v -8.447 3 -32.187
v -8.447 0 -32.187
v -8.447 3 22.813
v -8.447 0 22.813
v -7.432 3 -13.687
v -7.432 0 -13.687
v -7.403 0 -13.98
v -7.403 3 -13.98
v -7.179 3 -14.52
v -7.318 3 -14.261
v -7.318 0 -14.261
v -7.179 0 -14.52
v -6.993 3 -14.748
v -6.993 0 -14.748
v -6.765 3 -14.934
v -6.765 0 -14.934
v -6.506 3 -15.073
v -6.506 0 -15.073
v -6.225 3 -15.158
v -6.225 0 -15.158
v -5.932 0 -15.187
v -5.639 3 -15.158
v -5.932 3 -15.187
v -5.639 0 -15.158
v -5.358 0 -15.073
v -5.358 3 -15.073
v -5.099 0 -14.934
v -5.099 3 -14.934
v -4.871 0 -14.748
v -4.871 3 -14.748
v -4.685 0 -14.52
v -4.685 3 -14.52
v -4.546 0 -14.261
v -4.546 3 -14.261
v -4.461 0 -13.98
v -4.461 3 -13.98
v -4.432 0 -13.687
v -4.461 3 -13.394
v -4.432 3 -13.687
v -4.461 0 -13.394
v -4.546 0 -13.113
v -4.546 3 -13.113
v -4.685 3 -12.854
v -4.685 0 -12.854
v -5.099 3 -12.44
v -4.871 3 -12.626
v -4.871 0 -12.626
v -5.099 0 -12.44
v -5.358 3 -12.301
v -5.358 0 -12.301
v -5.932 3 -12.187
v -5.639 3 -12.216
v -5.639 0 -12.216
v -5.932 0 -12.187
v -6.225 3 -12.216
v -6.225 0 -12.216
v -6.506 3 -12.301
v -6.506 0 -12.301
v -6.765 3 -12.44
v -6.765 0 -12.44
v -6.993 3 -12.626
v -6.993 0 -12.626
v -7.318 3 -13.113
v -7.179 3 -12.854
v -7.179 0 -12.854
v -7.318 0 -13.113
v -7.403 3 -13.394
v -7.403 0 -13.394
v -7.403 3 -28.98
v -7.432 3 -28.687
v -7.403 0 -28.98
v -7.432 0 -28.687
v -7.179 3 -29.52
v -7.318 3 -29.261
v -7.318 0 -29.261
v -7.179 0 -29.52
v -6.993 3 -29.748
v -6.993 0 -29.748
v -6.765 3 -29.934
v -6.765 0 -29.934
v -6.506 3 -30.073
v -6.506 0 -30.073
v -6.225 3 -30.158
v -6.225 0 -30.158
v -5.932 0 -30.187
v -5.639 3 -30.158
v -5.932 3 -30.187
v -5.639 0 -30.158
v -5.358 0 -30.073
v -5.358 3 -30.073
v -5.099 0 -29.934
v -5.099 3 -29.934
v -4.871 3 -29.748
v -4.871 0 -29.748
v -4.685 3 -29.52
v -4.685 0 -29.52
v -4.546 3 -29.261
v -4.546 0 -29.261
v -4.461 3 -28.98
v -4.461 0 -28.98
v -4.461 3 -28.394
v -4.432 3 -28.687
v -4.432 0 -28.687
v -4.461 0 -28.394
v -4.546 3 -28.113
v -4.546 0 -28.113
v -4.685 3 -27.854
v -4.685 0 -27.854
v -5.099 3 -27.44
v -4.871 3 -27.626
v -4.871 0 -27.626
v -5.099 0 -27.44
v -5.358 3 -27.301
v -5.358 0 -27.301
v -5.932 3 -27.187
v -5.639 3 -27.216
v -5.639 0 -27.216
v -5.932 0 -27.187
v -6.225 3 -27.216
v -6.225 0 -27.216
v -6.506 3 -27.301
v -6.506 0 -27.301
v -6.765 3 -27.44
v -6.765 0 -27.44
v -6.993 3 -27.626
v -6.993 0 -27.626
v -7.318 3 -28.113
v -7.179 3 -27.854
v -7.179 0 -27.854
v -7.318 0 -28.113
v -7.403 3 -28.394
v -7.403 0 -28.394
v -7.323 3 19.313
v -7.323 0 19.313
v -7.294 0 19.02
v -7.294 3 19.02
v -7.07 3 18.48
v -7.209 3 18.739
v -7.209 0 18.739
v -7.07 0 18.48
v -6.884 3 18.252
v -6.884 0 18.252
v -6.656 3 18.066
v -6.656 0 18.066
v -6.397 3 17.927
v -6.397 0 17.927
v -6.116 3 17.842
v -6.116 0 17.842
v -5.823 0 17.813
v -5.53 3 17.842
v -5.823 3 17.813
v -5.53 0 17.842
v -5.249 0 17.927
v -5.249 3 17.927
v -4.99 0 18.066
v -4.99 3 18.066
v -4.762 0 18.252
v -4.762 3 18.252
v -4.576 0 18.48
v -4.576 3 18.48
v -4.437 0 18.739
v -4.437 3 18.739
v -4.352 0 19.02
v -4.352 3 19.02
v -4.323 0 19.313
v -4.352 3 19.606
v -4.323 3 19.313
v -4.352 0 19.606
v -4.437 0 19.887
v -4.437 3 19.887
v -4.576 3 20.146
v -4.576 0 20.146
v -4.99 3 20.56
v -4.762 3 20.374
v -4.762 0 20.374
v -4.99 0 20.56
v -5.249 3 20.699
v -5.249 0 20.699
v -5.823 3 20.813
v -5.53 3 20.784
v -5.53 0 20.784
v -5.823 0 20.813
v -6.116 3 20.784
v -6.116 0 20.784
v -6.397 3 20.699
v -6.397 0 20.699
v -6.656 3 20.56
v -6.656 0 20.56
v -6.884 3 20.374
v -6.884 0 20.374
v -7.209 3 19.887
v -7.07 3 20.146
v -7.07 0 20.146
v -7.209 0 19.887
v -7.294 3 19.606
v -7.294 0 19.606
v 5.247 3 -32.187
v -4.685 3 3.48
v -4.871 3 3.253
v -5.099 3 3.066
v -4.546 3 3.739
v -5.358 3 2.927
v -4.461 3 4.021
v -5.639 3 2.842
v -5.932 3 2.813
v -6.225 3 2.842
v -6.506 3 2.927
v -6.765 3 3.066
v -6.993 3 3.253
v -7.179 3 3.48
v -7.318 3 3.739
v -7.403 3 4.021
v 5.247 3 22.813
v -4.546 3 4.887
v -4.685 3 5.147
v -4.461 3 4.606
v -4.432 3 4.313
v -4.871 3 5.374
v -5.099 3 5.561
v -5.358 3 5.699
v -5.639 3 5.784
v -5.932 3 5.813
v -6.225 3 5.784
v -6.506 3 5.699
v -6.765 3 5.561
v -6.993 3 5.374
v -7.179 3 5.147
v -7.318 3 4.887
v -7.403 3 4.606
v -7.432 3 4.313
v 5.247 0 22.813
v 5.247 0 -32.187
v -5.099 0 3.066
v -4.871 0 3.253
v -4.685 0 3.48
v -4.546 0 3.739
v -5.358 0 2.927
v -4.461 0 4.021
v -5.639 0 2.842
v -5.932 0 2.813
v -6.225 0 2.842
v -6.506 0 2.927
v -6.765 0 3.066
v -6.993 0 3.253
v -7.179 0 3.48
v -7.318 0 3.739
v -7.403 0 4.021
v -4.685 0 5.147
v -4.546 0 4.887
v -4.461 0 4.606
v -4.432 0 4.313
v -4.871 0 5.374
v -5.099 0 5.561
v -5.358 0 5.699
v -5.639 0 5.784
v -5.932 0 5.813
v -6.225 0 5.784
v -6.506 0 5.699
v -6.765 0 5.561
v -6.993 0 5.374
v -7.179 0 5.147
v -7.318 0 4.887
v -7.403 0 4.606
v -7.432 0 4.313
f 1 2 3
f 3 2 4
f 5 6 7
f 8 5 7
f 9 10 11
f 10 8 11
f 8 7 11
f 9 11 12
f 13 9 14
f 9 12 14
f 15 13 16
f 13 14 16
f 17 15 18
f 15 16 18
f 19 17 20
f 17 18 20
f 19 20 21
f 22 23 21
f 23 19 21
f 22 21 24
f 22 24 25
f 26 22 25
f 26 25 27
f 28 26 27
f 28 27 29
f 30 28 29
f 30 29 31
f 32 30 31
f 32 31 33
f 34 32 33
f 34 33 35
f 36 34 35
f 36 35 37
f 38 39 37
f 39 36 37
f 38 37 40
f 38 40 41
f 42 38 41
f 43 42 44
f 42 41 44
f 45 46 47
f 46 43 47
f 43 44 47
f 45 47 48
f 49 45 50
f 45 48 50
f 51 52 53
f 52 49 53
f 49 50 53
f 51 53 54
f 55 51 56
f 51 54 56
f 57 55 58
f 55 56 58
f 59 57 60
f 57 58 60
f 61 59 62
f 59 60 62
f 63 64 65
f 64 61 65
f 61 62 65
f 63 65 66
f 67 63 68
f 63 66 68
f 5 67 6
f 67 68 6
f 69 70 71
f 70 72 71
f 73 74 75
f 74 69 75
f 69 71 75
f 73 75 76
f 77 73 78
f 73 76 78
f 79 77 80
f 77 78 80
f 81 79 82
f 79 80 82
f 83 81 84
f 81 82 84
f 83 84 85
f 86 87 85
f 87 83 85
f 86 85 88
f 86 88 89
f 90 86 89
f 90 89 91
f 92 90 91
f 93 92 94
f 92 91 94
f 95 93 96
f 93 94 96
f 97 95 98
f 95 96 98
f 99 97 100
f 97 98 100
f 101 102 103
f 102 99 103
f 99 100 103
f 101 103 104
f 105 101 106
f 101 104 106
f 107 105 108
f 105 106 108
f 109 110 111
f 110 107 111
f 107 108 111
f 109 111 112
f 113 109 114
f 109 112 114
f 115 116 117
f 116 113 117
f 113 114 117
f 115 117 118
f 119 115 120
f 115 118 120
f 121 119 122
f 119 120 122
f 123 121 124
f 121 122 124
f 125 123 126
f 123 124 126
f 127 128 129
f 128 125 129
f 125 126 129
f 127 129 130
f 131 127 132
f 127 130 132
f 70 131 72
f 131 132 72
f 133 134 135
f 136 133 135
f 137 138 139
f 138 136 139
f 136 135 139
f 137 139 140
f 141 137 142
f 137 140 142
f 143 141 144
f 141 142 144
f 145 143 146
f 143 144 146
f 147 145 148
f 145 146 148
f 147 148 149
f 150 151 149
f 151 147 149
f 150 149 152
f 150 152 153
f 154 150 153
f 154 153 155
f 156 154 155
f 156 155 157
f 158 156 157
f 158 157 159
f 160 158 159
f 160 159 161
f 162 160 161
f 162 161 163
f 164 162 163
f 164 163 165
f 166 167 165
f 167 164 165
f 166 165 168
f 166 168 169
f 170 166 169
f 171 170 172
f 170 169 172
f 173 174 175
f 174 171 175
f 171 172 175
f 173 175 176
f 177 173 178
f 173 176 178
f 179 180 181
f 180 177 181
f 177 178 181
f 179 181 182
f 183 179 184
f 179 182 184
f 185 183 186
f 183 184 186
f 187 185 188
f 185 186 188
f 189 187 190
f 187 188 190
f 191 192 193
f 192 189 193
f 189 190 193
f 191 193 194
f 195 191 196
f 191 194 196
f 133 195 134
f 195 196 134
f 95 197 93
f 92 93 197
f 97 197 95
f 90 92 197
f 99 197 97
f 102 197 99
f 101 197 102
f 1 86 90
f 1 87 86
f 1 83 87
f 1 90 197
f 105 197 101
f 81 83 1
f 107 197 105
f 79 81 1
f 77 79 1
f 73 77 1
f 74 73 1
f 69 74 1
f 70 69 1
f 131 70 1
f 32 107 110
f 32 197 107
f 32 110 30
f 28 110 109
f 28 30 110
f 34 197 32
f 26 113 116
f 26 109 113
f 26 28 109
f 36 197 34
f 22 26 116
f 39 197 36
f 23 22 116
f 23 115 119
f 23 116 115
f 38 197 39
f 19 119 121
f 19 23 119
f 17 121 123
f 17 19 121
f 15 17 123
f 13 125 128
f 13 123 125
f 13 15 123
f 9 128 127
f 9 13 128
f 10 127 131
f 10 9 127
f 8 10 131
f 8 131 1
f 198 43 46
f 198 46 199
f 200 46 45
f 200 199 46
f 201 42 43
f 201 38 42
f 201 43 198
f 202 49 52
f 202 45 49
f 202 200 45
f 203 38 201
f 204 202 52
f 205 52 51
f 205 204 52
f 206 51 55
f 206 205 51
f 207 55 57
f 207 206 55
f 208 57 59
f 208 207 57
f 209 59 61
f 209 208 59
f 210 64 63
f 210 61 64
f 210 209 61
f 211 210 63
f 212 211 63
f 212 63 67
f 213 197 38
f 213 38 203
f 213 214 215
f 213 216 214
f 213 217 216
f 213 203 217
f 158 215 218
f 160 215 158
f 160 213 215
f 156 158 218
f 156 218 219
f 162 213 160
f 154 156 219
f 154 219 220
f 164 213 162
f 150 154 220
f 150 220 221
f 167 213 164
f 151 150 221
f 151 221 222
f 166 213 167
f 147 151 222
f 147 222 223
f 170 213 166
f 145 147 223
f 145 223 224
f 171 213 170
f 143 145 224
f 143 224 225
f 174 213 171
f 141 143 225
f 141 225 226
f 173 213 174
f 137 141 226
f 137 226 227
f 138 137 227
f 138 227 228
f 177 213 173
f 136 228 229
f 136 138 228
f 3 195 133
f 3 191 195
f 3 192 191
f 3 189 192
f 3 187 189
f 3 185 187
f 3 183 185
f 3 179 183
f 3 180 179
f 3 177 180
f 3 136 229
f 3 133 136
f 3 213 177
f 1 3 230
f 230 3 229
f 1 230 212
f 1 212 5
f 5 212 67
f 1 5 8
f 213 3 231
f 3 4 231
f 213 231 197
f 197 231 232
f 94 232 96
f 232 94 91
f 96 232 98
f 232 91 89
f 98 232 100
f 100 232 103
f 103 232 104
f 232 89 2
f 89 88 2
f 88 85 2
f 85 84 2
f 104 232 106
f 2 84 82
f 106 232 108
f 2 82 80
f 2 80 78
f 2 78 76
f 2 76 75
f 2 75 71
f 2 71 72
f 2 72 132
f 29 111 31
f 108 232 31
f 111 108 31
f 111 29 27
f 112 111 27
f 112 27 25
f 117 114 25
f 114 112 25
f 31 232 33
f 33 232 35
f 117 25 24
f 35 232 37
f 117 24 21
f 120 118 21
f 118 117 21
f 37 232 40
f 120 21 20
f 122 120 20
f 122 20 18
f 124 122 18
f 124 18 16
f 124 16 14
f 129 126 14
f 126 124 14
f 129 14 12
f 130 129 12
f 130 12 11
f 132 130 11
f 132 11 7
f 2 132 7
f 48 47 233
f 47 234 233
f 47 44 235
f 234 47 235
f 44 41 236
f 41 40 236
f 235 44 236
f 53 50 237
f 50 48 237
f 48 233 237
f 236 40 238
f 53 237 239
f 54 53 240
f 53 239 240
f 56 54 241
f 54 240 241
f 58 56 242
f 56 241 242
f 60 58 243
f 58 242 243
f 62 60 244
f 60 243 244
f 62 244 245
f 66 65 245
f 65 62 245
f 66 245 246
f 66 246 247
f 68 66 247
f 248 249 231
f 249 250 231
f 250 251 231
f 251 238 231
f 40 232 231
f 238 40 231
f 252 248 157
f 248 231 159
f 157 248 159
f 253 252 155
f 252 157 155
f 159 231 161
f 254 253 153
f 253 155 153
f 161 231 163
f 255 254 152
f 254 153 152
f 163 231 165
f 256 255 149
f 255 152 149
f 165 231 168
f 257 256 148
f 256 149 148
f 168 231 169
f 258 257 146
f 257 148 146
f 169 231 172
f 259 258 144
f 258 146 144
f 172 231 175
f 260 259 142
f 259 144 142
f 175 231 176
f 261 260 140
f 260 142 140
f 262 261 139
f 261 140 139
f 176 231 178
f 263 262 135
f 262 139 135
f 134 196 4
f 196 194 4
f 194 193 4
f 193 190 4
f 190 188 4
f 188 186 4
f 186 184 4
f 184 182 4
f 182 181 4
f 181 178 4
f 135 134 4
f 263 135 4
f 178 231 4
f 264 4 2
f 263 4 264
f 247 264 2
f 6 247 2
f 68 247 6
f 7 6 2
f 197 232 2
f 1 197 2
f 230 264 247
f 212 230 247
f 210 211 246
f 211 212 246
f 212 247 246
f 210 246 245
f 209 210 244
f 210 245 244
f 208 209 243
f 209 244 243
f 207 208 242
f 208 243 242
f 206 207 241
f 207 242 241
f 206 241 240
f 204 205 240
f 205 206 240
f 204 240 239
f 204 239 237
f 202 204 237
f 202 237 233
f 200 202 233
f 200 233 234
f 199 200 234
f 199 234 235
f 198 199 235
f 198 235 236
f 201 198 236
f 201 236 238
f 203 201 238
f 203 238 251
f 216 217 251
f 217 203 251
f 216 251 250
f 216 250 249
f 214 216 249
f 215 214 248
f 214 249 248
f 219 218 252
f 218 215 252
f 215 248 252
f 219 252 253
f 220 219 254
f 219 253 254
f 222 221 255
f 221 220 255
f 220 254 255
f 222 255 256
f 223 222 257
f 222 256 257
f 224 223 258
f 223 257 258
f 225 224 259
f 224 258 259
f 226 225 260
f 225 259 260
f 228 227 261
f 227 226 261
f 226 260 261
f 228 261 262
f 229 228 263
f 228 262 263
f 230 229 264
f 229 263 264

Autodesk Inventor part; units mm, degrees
ref_plane "YZ Plane" through (0, 0, 0) normal (1, 0, 0) x (0, 1, 0)
ref_plane "XZ Plane" through (0, 0, 0) normal (0, 1, 0) x (-1, 0, 0)
ref_plane "XY Plane" through (0, 0, 0) normal (0, 0, 1) x (1, 0, 0)
sketch "Sketch1" plane through (0, 0, 0) normal (0, 1, 0) x (-1, 0, 0)
  line L0 (8.4467, 22.8129) -> (-5.2472, 22.8129)
  line L1 (-5.2472, 22.8129) -> (-5.2472, -32.1871)
  line L2 (-5.2472, -32.1871) -> (8.4467, -32.1871)
  line L3 (8.4467, -32.1871) -> (8.4467, 22.8129)
  circle A0 centre (5.8231, 19.3129) radius 1.5
  circle A1 centre (5.932, 4.3133) radius 1.5
  circle A2 centre (5.932, -28.6871) radius 1.5
  circle A3 centre (5.932, -13.6871) radius 1.5
  point P0 (0, 0)
  dimension "d0" = 3
  dimension "d1" = 3
  dimension "d2" = 15
  dimension "d3" = 55
  dimension "d4" = 3
  dimension "d5" = 3
  dimension "d6" = 15
  dimension "d7" = 3.5
  dimension "d8" = 3.5
extrude "Extrusion1" add sketch "Sketch1" along normal blind 3
properties part number "soporte"
